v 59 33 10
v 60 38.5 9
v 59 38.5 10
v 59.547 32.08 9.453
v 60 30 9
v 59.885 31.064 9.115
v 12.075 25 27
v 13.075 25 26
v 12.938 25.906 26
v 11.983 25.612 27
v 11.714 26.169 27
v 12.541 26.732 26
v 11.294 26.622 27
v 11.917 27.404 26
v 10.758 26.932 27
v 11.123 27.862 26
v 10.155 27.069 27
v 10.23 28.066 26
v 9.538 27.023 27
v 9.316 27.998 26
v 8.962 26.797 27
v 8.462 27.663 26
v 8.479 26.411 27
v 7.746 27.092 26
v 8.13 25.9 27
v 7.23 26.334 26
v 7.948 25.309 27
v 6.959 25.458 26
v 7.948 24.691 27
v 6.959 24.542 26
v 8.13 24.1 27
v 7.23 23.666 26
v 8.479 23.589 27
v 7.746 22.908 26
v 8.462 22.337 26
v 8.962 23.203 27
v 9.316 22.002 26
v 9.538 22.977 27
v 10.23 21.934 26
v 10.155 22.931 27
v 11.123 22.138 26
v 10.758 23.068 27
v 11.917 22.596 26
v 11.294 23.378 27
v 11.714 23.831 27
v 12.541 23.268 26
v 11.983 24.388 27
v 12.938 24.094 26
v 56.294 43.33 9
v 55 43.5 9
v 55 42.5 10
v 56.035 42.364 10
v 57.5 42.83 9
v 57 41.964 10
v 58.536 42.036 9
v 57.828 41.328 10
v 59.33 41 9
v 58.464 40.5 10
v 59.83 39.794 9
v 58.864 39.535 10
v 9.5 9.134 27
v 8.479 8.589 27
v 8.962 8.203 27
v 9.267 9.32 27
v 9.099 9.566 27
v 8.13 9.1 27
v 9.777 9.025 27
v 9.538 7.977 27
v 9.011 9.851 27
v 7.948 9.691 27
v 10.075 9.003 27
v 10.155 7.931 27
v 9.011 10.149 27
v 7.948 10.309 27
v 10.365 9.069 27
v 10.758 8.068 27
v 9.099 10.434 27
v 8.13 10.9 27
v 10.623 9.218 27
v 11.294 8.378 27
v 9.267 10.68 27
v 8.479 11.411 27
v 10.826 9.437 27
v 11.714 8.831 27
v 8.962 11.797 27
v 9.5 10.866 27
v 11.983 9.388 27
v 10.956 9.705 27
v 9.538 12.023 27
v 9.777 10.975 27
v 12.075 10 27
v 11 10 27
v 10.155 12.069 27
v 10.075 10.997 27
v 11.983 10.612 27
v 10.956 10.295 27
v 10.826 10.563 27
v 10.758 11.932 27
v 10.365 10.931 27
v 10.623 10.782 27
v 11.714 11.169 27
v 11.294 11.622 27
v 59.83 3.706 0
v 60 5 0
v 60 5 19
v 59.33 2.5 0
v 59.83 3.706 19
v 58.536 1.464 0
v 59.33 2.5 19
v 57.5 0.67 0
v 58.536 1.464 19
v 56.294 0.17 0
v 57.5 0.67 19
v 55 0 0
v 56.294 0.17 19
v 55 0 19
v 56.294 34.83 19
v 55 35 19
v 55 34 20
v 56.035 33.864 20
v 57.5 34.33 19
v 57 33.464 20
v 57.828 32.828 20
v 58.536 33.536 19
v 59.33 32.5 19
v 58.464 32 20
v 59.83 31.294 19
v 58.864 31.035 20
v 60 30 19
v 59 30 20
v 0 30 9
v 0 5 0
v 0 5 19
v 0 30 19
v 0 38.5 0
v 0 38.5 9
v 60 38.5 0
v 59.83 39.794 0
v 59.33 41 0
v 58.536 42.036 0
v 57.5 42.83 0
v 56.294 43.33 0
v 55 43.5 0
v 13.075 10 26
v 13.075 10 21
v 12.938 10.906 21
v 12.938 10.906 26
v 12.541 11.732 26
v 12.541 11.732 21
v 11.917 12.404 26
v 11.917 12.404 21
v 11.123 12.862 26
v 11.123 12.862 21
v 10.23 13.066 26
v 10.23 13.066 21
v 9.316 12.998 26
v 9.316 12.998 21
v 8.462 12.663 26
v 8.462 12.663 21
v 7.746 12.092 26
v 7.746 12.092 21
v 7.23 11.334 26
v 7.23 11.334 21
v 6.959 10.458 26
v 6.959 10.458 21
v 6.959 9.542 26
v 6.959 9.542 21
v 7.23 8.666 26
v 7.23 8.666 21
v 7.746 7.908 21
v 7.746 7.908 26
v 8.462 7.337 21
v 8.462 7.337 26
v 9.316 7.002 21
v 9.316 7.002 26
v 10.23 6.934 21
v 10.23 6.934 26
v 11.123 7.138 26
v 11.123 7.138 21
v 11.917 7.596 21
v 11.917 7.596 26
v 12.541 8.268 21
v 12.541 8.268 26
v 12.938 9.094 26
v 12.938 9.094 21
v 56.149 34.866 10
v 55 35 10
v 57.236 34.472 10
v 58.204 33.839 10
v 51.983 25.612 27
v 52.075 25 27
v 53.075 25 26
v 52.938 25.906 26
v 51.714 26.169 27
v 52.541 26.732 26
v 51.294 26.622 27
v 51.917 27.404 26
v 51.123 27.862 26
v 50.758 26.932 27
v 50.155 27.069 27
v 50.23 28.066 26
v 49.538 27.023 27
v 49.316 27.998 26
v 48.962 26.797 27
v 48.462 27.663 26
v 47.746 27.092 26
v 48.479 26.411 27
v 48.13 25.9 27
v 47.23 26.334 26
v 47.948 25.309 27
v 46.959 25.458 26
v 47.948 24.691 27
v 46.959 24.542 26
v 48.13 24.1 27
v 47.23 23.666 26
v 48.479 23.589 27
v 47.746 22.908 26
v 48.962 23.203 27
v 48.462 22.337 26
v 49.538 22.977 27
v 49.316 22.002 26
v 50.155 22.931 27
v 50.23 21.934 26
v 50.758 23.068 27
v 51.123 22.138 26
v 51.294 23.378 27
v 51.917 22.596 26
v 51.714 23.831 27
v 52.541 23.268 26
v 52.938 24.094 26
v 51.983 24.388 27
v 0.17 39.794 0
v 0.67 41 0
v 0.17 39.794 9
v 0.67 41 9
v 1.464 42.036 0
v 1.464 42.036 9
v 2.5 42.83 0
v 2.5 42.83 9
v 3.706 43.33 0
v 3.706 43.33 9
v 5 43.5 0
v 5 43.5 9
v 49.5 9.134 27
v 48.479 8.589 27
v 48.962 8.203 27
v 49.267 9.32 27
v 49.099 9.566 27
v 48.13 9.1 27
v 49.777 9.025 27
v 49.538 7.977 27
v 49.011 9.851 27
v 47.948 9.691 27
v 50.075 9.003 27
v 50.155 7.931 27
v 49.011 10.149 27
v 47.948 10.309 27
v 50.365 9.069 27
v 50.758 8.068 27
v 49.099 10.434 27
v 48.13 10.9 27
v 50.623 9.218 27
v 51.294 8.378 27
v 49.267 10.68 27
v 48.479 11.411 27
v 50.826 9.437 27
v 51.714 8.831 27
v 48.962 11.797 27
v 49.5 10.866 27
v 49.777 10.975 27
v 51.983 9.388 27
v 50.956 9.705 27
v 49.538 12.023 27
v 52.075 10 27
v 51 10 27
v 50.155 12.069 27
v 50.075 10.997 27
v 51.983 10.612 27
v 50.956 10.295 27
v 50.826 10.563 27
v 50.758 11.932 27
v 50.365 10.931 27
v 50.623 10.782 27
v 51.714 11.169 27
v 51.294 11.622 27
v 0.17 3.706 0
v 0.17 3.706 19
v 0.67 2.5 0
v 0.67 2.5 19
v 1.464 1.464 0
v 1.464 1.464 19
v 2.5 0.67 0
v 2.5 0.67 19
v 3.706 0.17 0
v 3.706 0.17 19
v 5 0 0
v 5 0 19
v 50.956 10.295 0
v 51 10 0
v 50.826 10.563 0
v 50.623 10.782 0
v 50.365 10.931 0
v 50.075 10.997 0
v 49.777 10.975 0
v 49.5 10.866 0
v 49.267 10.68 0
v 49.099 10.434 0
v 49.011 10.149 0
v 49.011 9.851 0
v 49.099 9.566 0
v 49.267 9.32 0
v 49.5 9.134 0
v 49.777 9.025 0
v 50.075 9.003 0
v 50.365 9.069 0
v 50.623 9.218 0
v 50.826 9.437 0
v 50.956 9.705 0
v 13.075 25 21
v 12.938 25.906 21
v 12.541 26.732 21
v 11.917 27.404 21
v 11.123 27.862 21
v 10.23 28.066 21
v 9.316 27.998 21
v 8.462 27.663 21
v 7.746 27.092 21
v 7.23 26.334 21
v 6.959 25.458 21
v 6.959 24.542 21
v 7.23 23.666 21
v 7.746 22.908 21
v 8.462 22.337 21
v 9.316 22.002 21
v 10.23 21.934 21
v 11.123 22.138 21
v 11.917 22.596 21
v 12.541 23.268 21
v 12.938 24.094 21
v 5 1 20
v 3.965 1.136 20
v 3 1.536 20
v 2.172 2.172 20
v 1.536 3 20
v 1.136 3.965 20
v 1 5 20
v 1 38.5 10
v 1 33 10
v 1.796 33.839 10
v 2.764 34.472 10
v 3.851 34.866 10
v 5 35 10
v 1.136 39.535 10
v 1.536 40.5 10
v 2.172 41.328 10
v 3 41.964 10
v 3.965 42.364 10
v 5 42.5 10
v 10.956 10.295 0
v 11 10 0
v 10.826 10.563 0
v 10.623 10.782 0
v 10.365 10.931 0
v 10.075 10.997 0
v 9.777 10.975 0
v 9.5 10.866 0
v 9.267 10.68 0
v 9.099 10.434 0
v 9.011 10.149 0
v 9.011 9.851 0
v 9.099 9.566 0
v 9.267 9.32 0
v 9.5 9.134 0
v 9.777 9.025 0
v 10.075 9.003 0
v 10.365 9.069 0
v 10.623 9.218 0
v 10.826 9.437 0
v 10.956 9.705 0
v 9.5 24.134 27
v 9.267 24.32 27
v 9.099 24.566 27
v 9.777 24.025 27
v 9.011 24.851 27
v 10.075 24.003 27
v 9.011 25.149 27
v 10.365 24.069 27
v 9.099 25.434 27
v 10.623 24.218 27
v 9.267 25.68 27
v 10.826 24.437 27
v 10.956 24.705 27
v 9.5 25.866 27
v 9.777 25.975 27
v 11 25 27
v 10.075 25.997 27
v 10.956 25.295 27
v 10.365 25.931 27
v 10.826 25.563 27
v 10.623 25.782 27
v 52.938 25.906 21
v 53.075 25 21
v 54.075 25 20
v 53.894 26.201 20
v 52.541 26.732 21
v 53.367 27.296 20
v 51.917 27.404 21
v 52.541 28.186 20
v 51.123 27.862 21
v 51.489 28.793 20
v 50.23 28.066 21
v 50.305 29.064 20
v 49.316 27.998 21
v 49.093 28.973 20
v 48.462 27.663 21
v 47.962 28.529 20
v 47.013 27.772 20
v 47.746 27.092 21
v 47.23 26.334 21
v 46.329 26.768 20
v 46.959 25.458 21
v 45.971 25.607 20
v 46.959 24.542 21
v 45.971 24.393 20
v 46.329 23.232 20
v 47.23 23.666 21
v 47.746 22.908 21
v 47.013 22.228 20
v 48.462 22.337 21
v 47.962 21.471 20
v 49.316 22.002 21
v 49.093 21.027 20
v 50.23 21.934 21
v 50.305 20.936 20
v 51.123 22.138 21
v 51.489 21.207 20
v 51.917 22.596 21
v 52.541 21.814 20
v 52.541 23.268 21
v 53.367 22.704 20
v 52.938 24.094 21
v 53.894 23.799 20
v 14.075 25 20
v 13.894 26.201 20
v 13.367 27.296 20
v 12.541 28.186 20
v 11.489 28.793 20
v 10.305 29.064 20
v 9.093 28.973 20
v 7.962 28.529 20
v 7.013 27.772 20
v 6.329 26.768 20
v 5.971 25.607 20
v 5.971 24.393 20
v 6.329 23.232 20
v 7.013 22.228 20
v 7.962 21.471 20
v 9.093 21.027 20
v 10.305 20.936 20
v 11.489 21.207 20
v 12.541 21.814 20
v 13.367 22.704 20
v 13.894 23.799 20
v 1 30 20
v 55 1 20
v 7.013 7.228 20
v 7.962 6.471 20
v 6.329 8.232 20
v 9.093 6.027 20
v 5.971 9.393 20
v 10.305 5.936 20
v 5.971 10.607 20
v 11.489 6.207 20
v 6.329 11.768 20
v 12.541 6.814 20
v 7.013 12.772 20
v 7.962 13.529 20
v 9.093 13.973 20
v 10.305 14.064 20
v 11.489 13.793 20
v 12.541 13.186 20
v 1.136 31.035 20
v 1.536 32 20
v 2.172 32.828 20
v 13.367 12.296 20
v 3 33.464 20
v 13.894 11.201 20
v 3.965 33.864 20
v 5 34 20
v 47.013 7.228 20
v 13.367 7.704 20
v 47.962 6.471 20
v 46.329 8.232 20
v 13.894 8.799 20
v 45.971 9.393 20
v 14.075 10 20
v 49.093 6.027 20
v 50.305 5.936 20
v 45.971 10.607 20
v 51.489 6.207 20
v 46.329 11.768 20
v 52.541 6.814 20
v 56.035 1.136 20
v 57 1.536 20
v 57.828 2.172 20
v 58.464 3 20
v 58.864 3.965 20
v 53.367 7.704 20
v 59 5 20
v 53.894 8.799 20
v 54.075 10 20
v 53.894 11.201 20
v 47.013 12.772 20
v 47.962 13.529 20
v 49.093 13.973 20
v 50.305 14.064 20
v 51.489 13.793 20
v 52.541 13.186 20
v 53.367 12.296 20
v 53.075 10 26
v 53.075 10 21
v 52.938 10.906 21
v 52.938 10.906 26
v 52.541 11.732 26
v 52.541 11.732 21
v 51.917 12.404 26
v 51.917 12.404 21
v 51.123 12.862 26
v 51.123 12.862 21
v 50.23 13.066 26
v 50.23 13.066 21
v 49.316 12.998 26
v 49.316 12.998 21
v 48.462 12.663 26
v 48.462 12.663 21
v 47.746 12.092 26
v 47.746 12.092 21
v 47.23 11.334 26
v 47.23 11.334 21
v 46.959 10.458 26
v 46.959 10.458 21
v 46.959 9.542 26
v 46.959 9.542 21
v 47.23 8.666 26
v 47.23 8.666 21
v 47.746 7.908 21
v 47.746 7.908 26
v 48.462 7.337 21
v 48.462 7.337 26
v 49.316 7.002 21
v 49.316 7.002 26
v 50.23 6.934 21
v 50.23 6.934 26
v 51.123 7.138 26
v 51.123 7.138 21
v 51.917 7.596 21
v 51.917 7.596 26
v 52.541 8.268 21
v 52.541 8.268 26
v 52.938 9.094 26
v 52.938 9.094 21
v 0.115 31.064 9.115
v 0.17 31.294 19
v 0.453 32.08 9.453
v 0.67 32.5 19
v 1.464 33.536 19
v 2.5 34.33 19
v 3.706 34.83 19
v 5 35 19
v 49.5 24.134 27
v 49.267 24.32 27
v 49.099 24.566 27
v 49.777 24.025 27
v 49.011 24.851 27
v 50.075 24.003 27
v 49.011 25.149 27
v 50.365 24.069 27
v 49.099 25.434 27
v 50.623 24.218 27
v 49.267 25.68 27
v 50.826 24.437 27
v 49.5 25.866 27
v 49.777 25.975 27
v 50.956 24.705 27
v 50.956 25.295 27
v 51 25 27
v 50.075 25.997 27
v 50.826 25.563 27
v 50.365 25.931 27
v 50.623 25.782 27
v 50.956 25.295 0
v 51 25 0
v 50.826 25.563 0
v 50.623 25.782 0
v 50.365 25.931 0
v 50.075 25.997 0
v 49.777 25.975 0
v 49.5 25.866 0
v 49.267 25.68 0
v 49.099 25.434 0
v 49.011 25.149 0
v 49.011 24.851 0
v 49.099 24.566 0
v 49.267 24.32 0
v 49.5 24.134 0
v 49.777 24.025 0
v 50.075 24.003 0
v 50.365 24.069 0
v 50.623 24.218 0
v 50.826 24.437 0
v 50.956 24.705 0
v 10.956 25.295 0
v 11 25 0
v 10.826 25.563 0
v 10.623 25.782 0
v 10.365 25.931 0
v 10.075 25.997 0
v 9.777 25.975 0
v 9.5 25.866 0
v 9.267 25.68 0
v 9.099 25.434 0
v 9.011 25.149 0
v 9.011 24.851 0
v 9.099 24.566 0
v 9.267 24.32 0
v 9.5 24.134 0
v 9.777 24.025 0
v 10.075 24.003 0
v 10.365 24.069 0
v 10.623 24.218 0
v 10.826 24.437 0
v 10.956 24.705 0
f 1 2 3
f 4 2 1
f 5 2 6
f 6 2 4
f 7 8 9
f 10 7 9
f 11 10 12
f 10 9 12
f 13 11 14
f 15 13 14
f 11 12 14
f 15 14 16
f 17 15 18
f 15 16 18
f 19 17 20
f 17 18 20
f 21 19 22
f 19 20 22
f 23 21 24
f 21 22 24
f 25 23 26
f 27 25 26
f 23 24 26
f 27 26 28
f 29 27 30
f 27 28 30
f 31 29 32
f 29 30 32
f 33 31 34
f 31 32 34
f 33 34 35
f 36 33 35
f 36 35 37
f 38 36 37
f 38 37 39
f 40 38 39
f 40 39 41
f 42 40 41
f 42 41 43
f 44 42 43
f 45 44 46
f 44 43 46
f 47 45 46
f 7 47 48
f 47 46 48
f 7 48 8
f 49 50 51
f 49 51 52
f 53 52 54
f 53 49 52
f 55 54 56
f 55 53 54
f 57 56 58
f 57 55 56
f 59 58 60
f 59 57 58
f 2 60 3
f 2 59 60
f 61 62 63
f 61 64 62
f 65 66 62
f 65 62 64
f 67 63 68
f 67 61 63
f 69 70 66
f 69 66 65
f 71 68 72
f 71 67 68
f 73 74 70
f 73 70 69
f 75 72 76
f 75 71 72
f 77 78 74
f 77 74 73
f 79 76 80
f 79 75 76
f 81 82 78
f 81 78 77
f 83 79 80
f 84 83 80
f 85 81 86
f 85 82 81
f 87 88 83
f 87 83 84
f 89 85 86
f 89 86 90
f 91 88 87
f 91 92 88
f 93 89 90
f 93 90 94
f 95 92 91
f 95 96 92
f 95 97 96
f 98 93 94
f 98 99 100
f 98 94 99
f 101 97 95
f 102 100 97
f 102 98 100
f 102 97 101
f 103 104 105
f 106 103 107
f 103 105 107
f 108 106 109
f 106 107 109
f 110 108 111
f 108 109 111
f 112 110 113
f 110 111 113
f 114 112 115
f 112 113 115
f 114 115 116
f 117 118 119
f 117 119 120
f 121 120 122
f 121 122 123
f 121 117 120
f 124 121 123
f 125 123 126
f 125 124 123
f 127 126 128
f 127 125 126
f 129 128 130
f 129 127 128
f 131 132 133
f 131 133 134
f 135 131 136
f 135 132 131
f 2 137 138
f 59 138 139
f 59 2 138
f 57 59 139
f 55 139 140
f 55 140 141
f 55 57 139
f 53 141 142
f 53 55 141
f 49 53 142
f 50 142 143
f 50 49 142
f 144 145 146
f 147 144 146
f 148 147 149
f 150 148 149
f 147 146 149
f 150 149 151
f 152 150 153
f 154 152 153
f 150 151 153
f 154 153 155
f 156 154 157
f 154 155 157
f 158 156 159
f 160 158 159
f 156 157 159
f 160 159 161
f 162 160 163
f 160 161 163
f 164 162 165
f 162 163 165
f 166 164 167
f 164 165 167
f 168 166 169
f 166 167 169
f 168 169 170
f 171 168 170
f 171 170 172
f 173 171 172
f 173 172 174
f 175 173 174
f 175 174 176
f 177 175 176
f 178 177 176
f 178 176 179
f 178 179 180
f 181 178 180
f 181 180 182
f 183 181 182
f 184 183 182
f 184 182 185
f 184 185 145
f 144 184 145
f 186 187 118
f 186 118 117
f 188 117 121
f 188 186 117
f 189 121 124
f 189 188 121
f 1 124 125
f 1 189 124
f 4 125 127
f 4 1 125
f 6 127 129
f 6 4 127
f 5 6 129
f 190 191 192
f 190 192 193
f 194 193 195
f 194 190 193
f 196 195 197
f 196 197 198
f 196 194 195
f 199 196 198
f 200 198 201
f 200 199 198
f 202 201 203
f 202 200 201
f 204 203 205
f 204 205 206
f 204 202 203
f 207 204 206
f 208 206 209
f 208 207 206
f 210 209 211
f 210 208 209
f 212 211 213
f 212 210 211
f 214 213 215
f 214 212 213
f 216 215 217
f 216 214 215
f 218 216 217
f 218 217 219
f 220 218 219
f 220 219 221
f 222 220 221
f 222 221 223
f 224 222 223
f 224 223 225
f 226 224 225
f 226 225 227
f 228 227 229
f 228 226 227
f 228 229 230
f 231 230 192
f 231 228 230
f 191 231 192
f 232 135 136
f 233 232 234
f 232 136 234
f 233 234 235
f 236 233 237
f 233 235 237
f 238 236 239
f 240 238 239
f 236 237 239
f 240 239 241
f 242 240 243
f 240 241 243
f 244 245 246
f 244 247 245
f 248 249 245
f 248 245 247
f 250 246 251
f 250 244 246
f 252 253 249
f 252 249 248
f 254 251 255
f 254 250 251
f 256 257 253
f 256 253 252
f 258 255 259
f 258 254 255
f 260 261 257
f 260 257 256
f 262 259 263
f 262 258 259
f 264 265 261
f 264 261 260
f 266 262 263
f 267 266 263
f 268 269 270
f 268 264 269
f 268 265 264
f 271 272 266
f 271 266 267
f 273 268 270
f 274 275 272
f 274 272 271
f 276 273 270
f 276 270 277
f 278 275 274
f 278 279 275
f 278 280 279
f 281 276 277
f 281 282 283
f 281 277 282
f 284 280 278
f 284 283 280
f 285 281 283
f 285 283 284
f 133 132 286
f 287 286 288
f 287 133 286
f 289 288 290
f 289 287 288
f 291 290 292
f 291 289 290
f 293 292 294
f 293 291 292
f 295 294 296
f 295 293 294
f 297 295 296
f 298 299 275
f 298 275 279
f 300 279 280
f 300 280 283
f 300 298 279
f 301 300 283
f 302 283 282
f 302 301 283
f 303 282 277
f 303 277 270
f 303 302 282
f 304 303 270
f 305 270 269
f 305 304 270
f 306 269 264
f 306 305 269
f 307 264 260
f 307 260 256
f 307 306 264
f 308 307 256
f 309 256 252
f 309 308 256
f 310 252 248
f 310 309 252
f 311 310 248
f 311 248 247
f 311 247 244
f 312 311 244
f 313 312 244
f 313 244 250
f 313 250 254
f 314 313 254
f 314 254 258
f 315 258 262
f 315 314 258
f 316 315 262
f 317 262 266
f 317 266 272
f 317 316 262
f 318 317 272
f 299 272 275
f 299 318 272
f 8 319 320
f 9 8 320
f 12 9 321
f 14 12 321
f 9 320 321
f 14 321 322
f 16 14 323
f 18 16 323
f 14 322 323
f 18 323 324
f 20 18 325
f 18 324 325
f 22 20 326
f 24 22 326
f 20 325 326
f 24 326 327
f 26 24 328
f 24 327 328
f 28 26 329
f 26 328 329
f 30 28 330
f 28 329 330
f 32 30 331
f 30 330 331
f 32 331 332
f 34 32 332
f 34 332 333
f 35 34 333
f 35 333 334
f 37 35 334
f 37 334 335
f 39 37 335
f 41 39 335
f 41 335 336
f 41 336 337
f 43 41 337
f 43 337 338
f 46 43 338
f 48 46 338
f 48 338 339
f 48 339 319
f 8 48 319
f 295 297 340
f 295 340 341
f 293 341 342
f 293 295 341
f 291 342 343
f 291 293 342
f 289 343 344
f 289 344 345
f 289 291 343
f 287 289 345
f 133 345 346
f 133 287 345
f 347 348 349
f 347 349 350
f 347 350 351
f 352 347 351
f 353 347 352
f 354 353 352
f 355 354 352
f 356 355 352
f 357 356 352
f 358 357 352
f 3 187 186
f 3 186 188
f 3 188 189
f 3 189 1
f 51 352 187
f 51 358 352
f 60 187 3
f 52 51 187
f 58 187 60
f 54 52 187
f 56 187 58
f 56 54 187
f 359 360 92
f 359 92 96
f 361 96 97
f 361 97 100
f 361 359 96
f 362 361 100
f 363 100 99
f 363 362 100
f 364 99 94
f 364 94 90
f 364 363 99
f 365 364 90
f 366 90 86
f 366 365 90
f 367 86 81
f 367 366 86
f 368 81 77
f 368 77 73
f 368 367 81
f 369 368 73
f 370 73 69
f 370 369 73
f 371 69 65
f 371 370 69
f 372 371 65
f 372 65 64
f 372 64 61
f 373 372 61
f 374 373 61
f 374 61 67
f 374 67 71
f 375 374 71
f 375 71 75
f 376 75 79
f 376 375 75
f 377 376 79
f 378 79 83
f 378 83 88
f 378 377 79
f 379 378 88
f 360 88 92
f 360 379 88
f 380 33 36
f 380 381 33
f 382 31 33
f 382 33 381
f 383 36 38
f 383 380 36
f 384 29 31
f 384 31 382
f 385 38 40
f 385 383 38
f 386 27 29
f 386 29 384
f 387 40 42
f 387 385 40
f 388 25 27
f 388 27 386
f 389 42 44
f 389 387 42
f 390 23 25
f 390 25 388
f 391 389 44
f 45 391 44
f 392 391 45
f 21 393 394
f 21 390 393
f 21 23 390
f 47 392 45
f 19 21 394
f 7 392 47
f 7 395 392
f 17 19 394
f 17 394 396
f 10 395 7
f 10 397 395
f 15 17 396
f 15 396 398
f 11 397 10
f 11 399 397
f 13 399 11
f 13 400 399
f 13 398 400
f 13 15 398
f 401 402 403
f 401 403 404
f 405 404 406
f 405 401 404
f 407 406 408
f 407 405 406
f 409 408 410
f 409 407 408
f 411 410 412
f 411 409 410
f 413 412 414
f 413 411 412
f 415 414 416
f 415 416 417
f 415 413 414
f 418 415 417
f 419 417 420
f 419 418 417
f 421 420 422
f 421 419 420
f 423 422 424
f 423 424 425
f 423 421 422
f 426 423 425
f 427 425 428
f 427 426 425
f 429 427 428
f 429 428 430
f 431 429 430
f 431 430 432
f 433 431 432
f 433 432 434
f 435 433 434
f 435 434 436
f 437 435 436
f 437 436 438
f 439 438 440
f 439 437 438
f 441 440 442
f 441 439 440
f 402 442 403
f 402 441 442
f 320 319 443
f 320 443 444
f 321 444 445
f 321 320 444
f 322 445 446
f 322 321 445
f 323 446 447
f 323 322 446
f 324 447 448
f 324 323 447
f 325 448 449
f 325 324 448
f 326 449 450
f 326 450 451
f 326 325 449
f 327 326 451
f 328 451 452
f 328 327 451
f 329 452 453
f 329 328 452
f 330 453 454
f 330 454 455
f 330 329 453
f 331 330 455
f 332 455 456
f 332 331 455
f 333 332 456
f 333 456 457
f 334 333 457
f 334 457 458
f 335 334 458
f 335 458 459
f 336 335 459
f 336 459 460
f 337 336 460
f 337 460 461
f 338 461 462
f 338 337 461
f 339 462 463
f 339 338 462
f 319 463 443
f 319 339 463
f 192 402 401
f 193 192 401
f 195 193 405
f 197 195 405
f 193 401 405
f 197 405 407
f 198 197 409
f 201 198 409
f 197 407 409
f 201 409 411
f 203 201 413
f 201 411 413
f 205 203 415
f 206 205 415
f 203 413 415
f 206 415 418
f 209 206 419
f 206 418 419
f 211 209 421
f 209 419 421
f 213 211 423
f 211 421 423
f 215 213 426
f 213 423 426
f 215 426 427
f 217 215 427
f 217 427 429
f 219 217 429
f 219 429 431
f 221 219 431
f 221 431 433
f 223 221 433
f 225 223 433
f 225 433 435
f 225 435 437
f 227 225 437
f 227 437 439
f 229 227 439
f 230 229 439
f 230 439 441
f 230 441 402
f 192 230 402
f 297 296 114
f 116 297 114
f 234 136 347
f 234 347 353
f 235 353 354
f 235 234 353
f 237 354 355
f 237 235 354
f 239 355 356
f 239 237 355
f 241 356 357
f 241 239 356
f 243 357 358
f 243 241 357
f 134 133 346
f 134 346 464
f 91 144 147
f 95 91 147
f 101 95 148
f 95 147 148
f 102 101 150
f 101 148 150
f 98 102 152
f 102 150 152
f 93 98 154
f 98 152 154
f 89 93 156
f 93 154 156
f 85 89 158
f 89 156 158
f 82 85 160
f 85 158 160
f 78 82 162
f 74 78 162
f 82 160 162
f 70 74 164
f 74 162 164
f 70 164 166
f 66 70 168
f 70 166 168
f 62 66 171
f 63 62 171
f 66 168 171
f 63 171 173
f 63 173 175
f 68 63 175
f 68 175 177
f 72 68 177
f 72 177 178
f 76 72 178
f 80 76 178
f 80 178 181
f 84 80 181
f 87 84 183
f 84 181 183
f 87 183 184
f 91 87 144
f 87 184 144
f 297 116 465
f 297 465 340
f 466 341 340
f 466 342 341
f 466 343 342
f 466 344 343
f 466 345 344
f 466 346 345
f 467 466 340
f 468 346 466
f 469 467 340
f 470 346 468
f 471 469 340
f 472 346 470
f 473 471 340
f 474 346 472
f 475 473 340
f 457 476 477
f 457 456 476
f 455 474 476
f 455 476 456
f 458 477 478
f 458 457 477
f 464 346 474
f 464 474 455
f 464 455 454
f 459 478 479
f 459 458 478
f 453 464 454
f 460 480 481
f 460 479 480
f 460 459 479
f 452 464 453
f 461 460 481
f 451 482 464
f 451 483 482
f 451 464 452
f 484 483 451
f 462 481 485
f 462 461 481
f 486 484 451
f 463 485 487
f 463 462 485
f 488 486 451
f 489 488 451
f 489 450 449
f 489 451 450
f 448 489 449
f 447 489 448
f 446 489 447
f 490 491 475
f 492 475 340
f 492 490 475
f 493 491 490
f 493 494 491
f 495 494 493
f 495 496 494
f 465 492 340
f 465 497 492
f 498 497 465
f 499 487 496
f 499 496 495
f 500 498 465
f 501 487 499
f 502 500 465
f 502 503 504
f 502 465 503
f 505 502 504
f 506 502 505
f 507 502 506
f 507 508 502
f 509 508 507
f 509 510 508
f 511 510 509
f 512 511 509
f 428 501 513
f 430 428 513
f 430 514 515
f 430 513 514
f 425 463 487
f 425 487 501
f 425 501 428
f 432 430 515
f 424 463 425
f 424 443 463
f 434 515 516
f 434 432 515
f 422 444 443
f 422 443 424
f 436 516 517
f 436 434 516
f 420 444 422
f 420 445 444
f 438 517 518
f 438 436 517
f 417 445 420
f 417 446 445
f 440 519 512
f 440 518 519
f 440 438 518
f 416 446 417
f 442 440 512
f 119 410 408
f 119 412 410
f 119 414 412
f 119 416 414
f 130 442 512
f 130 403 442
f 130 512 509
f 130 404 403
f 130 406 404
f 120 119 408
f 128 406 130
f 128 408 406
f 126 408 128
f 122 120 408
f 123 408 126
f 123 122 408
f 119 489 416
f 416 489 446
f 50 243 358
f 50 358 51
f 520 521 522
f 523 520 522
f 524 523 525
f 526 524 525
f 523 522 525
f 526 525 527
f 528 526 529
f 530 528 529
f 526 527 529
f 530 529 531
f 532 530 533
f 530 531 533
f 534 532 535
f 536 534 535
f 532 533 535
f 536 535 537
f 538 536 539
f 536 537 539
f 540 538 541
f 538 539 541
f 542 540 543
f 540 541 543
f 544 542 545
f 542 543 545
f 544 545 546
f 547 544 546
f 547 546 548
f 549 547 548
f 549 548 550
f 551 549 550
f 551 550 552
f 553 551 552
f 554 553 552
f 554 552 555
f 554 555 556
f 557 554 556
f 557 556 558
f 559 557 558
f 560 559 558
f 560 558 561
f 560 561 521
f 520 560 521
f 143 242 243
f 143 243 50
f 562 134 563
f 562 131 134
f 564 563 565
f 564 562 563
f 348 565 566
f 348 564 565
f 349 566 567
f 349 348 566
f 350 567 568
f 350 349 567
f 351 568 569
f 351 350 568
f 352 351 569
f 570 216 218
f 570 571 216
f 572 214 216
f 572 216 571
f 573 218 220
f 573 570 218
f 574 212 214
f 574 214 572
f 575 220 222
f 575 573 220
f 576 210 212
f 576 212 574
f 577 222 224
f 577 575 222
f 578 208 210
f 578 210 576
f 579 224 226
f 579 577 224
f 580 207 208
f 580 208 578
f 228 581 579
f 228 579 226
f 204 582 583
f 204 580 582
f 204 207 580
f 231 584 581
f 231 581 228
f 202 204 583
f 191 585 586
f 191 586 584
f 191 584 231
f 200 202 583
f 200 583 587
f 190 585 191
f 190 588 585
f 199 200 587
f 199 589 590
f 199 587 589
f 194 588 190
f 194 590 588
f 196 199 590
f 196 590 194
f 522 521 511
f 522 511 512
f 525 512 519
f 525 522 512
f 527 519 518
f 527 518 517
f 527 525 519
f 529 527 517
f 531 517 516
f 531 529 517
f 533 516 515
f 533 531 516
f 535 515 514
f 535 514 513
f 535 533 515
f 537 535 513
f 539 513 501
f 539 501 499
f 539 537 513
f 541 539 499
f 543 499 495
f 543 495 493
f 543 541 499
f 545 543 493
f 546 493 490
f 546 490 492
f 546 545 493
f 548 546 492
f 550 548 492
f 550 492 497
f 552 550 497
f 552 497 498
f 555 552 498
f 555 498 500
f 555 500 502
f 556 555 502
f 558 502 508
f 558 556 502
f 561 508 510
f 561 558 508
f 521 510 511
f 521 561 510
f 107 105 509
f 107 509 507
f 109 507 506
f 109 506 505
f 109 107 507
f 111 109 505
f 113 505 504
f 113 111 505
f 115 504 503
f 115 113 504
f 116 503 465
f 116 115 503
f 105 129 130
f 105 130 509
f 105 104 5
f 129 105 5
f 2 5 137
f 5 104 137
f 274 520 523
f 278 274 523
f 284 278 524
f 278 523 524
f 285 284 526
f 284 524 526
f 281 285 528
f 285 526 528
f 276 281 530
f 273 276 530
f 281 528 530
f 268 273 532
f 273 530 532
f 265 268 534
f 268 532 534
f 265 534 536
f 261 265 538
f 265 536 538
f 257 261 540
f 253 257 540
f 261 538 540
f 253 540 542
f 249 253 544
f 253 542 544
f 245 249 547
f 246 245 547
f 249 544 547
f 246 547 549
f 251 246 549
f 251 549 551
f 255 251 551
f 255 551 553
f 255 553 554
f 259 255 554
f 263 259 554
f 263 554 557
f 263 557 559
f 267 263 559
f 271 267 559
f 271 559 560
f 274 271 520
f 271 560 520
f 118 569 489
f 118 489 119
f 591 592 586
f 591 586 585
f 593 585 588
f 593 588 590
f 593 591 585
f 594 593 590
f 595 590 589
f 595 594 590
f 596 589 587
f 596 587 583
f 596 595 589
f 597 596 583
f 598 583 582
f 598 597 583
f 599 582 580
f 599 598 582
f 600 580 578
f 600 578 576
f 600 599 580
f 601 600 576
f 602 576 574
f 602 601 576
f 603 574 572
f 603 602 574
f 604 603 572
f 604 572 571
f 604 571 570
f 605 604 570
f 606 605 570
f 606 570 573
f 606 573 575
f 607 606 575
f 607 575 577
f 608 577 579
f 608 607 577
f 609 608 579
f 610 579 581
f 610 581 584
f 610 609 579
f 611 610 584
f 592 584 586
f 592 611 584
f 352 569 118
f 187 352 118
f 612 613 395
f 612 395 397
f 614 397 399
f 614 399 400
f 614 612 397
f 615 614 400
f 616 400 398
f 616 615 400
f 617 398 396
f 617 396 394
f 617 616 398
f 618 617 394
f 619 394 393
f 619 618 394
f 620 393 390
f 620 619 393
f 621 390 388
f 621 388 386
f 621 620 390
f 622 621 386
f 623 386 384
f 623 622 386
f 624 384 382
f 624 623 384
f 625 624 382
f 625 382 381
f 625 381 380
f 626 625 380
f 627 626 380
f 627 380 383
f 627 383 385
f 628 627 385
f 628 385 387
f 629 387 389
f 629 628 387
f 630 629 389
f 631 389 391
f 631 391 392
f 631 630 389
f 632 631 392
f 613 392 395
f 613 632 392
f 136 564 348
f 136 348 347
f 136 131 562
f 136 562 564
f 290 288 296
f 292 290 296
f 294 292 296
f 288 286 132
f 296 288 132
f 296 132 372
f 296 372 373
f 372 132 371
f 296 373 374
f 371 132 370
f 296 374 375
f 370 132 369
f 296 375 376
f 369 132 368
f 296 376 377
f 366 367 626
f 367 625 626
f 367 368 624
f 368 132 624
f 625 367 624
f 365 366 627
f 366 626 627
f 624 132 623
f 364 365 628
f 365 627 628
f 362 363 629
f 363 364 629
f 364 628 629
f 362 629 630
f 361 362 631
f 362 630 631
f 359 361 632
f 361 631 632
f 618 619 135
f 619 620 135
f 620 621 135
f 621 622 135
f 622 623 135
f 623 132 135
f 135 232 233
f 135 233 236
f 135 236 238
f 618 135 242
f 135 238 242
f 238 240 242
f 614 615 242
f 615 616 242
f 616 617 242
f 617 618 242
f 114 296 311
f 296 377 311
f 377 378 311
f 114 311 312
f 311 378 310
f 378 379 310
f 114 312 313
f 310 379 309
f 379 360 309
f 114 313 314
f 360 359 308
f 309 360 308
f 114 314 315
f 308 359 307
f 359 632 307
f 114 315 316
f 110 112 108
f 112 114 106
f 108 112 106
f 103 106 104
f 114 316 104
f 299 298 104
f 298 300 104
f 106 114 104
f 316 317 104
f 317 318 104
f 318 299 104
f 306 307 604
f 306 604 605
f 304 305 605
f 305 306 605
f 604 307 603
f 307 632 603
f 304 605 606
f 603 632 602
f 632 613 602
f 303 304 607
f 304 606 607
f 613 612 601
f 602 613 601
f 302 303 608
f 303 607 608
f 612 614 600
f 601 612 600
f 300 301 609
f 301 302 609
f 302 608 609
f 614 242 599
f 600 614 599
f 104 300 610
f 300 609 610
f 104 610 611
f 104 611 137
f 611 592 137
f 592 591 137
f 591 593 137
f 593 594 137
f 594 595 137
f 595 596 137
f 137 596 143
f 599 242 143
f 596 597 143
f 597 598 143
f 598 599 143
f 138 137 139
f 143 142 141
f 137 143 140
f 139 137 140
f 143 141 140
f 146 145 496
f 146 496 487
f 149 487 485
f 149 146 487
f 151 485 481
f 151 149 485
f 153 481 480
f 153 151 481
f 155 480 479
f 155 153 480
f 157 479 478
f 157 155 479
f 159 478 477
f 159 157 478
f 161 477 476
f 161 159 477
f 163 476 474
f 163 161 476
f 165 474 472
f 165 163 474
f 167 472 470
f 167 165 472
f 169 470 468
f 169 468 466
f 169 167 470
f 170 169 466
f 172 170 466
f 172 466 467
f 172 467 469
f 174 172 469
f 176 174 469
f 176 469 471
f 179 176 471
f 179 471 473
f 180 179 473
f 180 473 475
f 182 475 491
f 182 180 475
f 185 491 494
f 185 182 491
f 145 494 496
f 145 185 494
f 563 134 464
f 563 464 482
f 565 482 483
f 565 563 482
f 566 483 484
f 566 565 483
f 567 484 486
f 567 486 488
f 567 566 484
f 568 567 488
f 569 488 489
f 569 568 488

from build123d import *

# Parameters (mm, degrees)
F0_W     = 60
F0_H     = 43.5
F0_R     = 3.075
F1_DEPTH = 20
F0_R_2   = 1
F2_DEPTH = 27
F3_W     = 60
F3_H     = 8.5
F4_DEPTH = 10
F5_R     = 5
F6_SIZE  = 1


with BuildPart() as f1:
    # F0 (on Top) → F1 (new body)
    with BuildSketch(Plane.XY):
        with Locations((30, 21.75)):
            Rectangle(F0_W, F0_H)
        with Locations((10, 10)):
            Circle(F0_R, mode=Mode.SUBTRACT)
        with Locations((50, 10)):
            Circle(F0_R, mode=Mode.SUBTRACT)
        with Locations((10, 25)):
            Circle(F0_R, mode=Mode.SUBTRACT)
        with Locations((50, 25)):
            Circle(F0_R, mode=Mode.SUBTRACT)
    extrude(amount=F1_DEPTH)

    # F0 (on Top) → F2 (join)
    with BuildSketch(Plane.XY):
        with Locations((10, 25)):
            Circle(F0_R)
        with Locations((10, 25)):
            Circle(F0_R_2, mode=Mode.SUBTRACT)
        with Locations((10, 10)):
            Circle(F0_R)
        with Locations((10, 10)):
            Circle(F0_R_2, mode=Mode.SUBTRACT)
        with Locations((50, 10)):
            Circle(F0_R)
        with Locations((50, 10)):
            Circle(F0_R_2, mode=Mode.SUBTRACT)
        with Locations((50, 25)):
            Circle(F0_R)
        with Locations((50, 25)):
            Circle(F0_R_2, mode=Mode.SUBTRACT)
    extrude(amount=F2_DEPTH)

    # F3 (on face) → F4 (cut)
    with BuildSketch(Plane.XY.offset(20)):
        with Locations((30, 39.25)):
            Rectangle(F3_W, F3_H)
    extrude(amount=-F4_DEPTH, mode=Mode.SUBTRACT)

    # F5
    f5_edges = [f1.edges().sort_by_distance(p)[0] for p in [
        (60, 0, 10),
        (0, 0, 10),
        (60, 43.5, 5),
        (60, 35, 15),
        (0, 35, 15),
        (0, 43.5, 5),
    ]]
    fillet(f5_edges, radius=F5_R)

    # F6
    f6_edges = [f1.edges().sort_by_distance(p)[0] for p in [
        (30, 35, 20),
        (1.464466, 33.535534, 20),
        (58.535534, 33.535534, 20),
        (0, 17.5, 20),
        (60, 17.5, 20),
        (1.464466, 1.464466, 20),
        (58.535534, 1.464466, 20),
        (30, 0, 20),
        (6.925, 10, 20),
        (46.925, 10, 20),
        (6.925, 25, 20),
        (46.925, 25, 20),
        (6.925, 10, 27),
        (6.925, 25, 27),
        (46.925, 25, 27),
        (46.925, 10, 27),
        (30, 43.5, 10),
        (58.535534, 42.035534, 10),
    ]]
    chamfer(f6_edges, length=F6_SIZE)


solid = f1.part
